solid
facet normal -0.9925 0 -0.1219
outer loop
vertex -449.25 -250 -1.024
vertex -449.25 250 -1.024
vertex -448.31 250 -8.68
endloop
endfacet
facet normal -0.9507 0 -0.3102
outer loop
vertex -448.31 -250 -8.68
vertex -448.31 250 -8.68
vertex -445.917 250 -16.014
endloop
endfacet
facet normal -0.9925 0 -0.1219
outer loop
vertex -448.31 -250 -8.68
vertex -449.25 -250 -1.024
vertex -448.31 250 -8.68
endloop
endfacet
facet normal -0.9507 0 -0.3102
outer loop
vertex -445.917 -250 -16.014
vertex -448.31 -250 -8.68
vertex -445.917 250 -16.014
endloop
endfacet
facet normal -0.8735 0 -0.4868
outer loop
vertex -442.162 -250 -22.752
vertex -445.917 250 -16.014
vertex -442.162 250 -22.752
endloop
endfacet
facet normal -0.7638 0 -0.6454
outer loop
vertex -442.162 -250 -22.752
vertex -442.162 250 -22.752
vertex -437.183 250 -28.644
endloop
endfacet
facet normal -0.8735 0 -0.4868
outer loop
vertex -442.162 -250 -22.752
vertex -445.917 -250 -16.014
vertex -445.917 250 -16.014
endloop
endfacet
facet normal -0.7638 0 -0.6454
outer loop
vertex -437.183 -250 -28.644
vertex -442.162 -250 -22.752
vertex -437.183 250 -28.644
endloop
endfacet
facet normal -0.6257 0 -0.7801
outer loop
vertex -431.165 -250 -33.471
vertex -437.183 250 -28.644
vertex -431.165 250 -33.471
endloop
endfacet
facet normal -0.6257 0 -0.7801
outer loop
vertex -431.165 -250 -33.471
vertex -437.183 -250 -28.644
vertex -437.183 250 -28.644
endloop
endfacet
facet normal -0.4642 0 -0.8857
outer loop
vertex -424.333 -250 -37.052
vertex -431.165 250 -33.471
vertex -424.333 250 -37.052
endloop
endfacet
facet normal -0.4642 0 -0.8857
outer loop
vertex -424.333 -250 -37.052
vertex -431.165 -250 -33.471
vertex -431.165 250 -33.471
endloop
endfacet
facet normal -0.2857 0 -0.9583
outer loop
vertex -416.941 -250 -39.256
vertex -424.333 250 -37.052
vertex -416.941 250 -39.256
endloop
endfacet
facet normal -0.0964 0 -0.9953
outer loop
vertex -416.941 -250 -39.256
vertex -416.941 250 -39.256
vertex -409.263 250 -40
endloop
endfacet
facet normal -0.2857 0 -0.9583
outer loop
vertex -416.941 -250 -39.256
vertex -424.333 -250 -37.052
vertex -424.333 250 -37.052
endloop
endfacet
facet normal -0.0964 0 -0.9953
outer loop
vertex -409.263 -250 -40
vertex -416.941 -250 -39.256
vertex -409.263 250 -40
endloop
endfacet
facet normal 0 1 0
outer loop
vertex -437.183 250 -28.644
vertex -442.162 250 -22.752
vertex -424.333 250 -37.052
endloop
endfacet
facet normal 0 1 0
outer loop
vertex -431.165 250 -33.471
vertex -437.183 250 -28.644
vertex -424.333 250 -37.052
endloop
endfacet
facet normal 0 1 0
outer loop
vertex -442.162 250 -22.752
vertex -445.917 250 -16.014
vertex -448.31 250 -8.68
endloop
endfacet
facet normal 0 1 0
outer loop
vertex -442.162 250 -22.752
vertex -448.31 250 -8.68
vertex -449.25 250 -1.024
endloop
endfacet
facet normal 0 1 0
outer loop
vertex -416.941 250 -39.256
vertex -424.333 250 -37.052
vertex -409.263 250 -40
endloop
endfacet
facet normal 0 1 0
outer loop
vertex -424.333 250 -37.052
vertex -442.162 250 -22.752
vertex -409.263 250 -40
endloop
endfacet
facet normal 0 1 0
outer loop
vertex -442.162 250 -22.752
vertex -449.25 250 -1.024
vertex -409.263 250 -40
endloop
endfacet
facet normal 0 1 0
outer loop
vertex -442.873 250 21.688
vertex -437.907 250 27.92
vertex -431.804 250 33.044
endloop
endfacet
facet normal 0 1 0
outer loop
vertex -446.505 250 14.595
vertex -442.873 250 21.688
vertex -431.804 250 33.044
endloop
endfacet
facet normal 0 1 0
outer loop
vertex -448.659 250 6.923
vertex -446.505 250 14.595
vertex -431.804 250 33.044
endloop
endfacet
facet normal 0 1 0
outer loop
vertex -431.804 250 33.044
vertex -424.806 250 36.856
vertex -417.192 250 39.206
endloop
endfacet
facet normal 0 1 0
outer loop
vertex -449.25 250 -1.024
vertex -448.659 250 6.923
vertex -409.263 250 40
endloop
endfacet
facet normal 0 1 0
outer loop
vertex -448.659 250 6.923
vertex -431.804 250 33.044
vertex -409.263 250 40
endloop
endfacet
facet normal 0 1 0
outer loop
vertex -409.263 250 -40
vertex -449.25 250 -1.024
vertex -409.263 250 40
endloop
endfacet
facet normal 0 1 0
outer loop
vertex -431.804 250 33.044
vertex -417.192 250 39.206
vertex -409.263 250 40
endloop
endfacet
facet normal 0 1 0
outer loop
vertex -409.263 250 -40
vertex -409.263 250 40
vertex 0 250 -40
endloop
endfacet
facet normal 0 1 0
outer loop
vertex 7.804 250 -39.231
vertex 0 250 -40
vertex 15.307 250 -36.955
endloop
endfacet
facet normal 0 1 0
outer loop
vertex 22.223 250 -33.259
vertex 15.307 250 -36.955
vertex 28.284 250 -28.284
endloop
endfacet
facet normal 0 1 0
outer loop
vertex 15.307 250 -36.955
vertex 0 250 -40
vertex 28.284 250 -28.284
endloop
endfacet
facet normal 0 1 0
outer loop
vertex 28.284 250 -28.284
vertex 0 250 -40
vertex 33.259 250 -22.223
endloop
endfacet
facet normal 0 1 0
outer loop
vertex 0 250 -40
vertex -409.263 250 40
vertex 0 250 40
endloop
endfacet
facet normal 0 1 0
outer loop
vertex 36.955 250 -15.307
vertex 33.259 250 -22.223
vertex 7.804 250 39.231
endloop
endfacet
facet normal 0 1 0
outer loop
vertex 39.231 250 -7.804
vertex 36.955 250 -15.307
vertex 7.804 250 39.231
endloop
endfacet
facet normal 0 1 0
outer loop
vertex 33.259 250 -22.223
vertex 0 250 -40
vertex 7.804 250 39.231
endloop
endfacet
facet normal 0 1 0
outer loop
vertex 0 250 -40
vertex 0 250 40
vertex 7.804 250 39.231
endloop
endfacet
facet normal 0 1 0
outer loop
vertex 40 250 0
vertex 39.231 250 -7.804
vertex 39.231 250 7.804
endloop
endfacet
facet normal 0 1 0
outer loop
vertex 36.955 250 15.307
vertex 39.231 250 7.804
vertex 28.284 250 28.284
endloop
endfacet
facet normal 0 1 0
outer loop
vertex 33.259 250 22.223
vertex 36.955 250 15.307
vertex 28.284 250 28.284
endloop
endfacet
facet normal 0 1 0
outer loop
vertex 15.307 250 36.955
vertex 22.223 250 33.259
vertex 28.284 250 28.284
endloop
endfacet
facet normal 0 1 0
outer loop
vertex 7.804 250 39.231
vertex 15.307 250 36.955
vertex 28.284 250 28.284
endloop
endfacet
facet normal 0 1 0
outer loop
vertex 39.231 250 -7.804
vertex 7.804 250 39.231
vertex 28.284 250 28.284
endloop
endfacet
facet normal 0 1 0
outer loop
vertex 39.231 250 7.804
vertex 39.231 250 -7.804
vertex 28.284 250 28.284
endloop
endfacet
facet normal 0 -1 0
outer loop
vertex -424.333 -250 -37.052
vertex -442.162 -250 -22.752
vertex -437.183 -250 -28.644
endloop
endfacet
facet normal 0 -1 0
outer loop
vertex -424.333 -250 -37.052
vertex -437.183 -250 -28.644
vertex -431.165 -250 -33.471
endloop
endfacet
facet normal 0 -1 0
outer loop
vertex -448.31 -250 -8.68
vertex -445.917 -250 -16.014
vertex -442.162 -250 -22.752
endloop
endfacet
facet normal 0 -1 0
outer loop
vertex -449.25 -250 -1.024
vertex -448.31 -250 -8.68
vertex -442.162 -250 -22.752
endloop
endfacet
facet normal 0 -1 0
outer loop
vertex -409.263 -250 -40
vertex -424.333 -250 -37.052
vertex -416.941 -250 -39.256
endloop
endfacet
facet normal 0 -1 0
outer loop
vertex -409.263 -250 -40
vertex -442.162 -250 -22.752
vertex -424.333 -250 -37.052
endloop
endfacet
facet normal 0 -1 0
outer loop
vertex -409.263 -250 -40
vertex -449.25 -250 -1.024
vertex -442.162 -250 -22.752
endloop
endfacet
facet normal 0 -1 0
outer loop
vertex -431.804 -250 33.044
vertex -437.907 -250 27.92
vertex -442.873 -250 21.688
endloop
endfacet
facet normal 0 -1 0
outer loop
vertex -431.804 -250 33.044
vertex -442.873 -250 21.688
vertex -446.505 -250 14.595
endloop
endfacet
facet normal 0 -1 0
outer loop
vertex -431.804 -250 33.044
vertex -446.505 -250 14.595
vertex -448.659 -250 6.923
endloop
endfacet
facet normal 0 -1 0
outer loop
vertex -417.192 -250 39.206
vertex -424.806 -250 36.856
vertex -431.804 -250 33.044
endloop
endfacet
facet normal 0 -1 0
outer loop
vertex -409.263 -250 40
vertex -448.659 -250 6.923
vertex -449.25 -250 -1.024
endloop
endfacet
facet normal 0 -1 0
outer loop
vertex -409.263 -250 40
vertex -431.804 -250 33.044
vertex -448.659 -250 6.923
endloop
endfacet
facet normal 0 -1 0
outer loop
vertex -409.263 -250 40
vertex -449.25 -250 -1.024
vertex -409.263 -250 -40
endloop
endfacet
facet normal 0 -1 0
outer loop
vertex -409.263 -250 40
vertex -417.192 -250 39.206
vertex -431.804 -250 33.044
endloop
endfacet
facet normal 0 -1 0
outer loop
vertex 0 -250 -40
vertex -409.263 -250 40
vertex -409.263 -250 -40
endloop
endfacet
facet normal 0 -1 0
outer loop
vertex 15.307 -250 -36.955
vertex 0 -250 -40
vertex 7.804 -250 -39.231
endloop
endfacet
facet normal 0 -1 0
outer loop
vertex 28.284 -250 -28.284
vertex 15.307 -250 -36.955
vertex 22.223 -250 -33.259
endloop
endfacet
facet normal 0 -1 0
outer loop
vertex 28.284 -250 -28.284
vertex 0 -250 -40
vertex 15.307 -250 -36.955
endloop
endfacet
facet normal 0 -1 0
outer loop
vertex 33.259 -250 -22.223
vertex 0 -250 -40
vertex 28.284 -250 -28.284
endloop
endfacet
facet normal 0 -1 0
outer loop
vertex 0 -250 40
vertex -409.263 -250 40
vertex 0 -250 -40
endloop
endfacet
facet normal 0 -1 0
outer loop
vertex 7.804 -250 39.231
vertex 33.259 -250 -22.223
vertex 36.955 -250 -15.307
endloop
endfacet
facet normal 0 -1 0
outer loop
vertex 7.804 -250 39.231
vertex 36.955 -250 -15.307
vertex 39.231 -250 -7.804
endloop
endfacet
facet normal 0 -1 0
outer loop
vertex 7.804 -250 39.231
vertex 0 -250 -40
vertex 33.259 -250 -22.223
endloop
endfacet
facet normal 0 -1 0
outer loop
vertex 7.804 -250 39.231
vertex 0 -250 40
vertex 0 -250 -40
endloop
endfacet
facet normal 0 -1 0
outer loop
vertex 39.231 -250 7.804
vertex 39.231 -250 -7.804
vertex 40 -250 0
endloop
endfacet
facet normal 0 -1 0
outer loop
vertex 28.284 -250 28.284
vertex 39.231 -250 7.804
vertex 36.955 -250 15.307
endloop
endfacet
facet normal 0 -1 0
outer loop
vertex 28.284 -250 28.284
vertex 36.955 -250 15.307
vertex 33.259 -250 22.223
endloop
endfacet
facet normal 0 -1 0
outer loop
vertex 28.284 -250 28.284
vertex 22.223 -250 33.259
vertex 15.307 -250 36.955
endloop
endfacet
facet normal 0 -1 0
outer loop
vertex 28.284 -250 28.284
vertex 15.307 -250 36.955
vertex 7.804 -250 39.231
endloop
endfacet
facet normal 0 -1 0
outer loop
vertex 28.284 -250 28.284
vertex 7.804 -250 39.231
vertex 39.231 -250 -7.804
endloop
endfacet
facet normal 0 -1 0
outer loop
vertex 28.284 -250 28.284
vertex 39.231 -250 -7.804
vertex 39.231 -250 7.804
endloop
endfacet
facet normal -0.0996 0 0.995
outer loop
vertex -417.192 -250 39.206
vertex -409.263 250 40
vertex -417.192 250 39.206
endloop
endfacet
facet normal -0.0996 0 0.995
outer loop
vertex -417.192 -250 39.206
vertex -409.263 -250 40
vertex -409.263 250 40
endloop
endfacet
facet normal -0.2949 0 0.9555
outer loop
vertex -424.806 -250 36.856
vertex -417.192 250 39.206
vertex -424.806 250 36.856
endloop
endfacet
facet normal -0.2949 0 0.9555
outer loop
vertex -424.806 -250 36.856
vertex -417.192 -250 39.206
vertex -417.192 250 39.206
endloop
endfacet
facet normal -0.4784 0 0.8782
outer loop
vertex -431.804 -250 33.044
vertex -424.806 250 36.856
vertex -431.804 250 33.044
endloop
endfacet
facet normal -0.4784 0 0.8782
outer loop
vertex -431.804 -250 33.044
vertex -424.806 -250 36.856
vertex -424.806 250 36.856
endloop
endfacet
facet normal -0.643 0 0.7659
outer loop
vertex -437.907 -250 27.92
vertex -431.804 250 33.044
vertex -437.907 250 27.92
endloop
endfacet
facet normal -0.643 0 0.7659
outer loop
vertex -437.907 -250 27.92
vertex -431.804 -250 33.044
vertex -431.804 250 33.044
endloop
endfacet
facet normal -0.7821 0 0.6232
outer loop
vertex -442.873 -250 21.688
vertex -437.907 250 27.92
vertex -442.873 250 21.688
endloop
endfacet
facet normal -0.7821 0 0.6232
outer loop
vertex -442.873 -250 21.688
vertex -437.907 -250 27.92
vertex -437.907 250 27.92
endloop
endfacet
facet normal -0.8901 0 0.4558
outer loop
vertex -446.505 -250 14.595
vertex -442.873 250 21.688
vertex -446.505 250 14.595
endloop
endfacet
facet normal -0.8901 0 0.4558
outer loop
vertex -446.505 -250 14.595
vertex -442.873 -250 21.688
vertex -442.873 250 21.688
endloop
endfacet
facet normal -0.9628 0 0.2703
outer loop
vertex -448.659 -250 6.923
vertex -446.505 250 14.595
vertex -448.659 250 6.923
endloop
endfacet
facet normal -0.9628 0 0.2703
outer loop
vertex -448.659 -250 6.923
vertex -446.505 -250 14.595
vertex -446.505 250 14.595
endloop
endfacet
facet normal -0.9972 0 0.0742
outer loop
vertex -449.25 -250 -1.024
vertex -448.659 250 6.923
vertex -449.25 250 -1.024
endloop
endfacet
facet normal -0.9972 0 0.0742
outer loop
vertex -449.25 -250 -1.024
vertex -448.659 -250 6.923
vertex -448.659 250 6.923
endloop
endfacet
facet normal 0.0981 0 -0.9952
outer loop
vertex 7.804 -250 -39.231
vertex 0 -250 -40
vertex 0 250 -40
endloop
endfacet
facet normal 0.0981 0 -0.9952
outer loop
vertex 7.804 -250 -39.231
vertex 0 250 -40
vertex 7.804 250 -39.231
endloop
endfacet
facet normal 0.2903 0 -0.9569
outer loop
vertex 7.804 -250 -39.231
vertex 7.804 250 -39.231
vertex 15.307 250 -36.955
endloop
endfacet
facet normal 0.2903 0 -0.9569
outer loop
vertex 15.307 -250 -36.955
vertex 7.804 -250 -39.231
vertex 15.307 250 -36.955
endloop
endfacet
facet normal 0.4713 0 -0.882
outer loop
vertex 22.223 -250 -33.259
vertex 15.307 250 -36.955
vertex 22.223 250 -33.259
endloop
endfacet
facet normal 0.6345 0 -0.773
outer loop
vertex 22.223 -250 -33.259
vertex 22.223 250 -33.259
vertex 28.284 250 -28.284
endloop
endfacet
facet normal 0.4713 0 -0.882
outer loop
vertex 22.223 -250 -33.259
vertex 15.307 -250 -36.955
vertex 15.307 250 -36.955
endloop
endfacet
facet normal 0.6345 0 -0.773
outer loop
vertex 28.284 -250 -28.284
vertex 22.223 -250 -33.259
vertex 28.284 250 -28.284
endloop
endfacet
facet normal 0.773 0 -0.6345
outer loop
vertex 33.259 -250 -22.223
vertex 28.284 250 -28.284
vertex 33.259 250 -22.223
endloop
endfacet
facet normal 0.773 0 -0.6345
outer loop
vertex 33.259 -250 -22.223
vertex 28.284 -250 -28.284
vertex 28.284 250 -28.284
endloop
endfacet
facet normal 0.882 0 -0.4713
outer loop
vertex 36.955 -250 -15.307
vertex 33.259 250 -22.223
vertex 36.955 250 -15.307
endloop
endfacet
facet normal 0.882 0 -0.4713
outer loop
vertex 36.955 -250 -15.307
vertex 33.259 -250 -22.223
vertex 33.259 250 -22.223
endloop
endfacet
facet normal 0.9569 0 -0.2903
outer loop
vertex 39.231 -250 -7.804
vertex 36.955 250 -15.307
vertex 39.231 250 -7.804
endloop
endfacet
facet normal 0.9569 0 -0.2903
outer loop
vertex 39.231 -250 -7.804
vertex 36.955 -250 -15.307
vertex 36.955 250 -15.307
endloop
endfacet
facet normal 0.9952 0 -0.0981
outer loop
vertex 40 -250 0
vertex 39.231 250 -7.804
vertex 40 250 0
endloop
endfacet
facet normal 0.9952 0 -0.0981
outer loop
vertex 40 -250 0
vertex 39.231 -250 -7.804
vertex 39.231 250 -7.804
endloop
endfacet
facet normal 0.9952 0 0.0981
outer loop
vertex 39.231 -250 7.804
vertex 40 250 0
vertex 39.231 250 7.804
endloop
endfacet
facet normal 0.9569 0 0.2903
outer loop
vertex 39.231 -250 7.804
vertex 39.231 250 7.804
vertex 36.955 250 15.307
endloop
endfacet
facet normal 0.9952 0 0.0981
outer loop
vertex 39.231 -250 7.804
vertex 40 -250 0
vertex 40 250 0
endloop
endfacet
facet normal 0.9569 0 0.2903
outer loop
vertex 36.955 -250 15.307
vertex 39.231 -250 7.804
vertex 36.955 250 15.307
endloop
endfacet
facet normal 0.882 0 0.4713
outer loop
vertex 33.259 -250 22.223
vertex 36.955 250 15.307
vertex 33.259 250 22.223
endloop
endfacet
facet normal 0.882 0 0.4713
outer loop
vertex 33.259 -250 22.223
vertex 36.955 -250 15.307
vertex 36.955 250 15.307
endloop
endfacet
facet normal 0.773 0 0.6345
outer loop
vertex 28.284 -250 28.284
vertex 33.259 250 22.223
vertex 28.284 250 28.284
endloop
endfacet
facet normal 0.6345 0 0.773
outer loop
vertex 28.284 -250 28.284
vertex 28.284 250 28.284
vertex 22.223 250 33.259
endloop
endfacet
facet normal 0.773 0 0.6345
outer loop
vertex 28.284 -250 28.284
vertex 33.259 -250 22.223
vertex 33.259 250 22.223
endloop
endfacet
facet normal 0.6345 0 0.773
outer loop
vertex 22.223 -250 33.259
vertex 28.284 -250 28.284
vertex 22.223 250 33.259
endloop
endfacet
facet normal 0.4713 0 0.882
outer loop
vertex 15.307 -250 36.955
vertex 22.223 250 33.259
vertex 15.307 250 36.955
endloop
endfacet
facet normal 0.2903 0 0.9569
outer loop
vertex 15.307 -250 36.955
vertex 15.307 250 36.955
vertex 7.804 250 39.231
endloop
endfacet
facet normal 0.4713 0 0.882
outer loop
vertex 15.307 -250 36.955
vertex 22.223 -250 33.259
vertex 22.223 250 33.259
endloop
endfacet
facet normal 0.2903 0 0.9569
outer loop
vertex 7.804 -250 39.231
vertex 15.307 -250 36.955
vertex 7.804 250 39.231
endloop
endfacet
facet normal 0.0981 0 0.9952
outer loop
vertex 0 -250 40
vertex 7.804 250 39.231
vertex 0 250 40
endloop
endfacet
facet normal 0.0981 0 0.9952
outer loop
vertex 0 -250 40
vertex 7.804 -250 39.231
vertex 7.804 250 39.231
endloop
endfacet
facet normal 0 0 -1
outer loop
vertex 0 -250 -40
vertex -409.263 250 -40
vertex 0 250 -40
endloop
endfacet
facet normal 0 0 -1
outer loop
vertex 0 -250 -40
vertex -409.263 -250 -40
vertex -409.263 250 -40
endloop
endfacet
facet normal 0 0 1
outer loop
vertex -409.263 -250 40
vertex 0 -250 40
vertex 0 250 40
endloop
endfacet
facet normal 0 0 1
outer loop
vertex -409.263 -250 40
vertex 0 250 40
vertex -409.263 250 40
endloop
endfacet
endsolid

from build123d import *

# Parameters (mm, degrees)
F1_DEPTH = 250


with BuildPart() as f1:
    # F0 (on Front) → F1 (new body, symmetric)
    with BuildSketch(Plane.XZ):
        with BuildLine():
            Line((-409.262752, -40), (0, -40))
            ThreePointArc((0, -40), (40, 0), (0, 40))
            Line((0, 40), (-409.262752, 40))
            ThreePointArc((-409.262752, 40), (-437.90667, 27.919992), (-449.24965, -1.023701))
            ThreePointArc((-449.24965, -1.023701), (-437.182744, -28.643918), (-409.262752, -40))
        make_face()
    extrude(amount=F1_DEPTH, both=True)


solid = f1.part
